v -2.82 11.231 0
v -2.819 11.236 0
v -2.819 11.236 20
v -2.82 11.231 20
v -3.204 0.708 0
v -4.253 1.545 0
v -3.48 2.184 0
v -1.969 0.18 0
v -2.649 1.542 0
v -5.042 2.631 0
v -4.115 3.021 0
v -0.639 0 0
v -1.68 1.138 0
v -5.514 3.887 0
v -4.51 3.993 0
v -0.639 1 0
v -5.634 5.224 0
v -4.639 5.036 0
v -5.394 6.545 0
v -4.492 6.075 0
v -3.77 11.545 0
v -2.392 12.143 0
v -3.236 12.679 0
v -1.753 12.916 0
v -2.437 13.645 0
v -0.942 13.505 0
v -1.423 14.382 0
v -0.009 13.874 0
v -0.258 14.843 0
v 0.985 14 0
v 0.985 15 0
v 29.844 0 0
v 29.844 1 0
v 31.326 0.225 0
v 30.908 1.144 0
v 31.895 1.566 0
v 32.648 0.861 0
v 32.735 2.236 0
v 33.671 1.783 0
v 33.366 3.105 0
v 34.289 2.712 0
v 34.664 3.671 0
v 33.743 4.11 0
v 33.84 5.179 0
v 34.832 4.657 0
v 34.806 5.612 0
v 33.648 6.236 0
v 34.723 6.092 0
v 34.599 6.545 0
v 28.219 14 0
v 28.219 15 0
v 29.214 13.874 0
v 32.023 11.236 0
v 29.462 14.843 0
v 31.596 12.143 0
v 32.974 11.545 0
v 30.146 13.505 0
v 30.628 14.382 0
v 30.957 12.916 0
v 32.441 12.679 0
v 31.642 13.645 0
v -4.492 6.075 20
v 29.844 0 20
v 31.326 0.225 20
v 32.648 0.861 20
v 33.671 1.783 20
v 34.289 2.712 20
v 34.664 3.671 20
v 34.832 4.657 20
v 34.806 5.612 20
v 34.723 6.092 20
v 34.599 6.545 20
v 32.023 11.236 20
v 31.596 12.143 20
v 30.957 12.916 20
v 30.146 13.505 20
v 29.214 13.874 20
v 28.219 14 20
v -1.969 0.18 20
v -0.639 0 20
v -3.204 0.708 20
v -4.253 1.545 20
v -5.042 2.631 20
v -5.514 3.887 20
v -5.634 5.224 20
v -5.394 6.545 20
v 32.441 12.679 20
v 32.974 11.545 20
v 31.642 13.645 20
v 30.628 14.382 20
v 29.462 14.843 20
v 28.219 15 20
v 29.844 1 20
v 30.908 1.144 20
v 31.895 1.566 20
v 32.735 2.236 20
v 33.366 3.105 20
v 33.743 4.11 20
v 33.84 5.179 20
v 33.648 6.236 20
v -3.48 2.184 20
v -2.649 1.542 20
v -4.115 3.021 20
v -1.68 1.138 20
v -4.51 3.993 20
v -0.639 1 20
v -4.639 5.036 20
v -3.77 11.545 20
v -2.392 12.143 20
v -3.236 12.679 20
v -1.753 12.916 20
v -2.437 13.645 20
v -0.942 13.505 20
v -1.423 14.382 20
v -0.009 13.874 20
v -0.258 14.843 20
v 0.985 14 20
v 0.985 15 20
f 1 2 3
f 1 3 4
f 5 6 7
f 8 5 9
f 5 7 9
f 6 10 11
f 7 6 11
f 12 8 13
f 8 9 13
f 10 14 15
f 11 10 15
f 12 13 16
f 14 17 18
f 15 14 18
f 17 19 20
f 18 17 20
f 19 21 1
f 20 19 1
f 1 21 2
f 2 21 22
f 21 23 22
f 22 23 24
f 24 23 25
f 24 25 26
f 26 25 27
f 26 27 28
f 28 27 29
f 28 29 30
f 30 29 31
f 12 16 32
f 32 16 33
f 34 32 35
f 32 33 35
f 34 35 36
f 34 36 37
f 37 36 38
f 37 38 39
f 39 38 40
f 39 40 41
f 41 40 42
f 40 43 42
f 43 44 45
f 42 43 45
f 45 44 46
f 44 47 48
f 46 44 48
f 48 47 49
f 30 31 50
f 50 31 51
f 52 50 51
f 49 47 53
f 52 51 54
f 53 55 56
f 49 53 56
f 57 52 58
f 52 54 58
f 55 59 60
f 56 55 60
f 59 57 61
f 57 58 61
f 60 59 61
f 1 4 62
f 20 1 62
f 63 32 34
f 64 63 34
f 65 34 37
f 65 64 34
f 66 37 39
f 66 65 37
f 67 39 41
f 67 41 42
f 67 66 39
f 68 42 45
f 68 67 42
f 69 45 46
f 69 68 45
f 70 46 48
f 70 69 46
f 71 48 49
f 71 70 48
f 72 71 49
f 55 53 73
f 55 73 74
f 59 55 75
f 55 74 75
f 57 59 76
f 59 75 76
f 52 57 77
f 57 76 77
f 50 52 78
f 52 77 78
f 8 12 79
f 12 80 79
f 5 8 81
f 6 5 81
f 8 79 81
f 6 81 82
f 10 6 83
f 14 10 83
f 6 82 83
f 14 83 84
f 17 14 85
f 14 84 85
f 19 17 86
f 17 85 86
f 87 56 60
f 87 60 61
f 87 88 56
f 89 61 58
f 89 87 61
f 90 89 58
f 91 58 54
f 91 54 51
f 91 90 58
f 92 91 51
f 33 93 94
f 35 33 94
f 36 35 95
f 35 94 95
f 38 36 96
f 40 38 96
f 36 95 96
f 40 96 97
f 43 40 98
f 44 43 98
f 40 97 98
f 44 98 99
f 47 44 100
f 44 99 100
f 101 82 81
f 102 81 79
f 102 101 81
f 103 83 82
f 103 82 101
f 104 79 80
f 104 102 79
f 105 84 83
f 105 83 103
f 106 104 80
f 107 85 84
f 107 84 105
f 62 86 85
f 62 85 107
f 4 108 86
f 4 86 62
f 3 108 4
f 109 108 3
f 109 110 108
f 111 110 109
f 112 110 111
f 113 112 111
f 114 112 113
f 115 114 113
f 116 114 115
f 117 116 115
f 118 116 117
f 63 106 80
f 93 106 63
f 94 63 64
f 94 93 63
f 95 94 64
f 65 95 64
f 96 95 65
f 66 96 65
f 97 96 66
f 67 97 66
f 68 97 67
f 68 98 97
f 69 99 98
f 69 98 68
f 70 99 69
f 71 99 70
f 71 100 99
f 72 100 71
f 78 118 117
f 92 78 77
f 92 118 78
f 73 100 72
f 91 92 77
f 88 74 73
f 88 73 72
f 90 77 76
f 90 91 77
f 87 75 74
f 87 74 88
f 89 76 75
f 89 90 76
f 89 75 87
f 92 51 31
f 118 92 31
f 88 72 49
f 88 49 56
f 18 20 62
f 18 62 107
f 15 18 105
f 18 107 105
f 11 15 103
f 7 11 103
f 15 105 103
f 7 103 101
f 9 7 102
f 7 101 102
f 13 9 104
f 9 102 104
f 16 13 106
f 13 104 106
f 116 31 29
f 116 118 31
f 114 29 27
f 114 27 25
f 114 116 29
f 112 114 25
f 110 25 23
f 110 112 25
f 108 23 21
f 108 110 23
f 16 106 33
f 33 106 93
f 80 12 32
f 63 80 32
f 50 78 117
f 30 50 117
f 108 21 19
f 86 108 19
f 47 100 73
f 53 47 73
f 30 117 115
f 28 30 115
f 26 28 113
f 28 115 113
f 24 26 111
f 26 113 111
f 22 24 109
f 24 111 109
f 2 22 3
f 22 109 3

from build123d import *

# Parameters (mm, degrees)
DODANIE_WYCI_GNI_CIE1_DEPTH = 20
ZAOKR_GLENIE2_R             = 5
WYTNIJ_WYCI_GNI_CIE1_DEPTH  = 43.884482968


with BuildPart() as part:
    # Szkic1 → Dodanie-wyciągnięcie1 (new body)
    with BuildSketch(Plane.XY):
        Polygon((-7.521041545, 0), (36.725544307, 0), (35.100945826, 5), (31.851748863, 15), (-2.647246102, 15), (-5.896443064, 5), align=None)
    extrude(amount=DODANIE_WYCI_GNI_CIE1_DEPTH)

    # Zaokrąglenie2
    zaokr_glenie2_edges = [part.edges().sort_by_distance(p)[0] for p in [
        (36.725544307, 0, 10),
        (-7.521041545, 0, 10),
        (-2.647246102, 15, 10),
        (31.851748863, 15, 10),
    ]]
    fillet(zaokr_glenie2_edges, radius=ZAOKR_GLENIE2_R)

    # Szkic2 → Wytnij-wyciągnięcie1 (cut, through all)
    with BuildSketch(Plane.XY.offset(20)):
        with BuildLine():
            Line((28.219036223, 14), (0.985466538, 14))
            ThreePointArc((0.985466538, 14), (-1.365674471, 13.236067977), (-2.818759527, 11.236067977))
            Line((-2.818759527, 11.236067977), (-2.820363357, 11.231120957))
            Line((-2.820363357, 11.231120957), (-4.491898112, 6.075264084))
            ThreePointArc((-4.491898112, 6.075264084), (-3.825121298, 2.581431863), (-0.639131943, 1))
            Line((-0.639131943, 1), (29.843634705, 1))
            ThreePointArc((29.843634705, 1), (33.079702682, 2.648858991), (33.64786077, 6.236067977))
            Line((33.64786077, 6.236067977), (32.023262289, 11.236067977))
            ThreePointArc((32.023262289, 11.236067977), (30.570177233, 13.236067977), (28.219036223, 14))
        make_face()
    extrude(amount=-WYTNIJ_WYCI_GNI_CIE1_DEPTH, mode=Mode.SUBTRACT)


solid = part.part
